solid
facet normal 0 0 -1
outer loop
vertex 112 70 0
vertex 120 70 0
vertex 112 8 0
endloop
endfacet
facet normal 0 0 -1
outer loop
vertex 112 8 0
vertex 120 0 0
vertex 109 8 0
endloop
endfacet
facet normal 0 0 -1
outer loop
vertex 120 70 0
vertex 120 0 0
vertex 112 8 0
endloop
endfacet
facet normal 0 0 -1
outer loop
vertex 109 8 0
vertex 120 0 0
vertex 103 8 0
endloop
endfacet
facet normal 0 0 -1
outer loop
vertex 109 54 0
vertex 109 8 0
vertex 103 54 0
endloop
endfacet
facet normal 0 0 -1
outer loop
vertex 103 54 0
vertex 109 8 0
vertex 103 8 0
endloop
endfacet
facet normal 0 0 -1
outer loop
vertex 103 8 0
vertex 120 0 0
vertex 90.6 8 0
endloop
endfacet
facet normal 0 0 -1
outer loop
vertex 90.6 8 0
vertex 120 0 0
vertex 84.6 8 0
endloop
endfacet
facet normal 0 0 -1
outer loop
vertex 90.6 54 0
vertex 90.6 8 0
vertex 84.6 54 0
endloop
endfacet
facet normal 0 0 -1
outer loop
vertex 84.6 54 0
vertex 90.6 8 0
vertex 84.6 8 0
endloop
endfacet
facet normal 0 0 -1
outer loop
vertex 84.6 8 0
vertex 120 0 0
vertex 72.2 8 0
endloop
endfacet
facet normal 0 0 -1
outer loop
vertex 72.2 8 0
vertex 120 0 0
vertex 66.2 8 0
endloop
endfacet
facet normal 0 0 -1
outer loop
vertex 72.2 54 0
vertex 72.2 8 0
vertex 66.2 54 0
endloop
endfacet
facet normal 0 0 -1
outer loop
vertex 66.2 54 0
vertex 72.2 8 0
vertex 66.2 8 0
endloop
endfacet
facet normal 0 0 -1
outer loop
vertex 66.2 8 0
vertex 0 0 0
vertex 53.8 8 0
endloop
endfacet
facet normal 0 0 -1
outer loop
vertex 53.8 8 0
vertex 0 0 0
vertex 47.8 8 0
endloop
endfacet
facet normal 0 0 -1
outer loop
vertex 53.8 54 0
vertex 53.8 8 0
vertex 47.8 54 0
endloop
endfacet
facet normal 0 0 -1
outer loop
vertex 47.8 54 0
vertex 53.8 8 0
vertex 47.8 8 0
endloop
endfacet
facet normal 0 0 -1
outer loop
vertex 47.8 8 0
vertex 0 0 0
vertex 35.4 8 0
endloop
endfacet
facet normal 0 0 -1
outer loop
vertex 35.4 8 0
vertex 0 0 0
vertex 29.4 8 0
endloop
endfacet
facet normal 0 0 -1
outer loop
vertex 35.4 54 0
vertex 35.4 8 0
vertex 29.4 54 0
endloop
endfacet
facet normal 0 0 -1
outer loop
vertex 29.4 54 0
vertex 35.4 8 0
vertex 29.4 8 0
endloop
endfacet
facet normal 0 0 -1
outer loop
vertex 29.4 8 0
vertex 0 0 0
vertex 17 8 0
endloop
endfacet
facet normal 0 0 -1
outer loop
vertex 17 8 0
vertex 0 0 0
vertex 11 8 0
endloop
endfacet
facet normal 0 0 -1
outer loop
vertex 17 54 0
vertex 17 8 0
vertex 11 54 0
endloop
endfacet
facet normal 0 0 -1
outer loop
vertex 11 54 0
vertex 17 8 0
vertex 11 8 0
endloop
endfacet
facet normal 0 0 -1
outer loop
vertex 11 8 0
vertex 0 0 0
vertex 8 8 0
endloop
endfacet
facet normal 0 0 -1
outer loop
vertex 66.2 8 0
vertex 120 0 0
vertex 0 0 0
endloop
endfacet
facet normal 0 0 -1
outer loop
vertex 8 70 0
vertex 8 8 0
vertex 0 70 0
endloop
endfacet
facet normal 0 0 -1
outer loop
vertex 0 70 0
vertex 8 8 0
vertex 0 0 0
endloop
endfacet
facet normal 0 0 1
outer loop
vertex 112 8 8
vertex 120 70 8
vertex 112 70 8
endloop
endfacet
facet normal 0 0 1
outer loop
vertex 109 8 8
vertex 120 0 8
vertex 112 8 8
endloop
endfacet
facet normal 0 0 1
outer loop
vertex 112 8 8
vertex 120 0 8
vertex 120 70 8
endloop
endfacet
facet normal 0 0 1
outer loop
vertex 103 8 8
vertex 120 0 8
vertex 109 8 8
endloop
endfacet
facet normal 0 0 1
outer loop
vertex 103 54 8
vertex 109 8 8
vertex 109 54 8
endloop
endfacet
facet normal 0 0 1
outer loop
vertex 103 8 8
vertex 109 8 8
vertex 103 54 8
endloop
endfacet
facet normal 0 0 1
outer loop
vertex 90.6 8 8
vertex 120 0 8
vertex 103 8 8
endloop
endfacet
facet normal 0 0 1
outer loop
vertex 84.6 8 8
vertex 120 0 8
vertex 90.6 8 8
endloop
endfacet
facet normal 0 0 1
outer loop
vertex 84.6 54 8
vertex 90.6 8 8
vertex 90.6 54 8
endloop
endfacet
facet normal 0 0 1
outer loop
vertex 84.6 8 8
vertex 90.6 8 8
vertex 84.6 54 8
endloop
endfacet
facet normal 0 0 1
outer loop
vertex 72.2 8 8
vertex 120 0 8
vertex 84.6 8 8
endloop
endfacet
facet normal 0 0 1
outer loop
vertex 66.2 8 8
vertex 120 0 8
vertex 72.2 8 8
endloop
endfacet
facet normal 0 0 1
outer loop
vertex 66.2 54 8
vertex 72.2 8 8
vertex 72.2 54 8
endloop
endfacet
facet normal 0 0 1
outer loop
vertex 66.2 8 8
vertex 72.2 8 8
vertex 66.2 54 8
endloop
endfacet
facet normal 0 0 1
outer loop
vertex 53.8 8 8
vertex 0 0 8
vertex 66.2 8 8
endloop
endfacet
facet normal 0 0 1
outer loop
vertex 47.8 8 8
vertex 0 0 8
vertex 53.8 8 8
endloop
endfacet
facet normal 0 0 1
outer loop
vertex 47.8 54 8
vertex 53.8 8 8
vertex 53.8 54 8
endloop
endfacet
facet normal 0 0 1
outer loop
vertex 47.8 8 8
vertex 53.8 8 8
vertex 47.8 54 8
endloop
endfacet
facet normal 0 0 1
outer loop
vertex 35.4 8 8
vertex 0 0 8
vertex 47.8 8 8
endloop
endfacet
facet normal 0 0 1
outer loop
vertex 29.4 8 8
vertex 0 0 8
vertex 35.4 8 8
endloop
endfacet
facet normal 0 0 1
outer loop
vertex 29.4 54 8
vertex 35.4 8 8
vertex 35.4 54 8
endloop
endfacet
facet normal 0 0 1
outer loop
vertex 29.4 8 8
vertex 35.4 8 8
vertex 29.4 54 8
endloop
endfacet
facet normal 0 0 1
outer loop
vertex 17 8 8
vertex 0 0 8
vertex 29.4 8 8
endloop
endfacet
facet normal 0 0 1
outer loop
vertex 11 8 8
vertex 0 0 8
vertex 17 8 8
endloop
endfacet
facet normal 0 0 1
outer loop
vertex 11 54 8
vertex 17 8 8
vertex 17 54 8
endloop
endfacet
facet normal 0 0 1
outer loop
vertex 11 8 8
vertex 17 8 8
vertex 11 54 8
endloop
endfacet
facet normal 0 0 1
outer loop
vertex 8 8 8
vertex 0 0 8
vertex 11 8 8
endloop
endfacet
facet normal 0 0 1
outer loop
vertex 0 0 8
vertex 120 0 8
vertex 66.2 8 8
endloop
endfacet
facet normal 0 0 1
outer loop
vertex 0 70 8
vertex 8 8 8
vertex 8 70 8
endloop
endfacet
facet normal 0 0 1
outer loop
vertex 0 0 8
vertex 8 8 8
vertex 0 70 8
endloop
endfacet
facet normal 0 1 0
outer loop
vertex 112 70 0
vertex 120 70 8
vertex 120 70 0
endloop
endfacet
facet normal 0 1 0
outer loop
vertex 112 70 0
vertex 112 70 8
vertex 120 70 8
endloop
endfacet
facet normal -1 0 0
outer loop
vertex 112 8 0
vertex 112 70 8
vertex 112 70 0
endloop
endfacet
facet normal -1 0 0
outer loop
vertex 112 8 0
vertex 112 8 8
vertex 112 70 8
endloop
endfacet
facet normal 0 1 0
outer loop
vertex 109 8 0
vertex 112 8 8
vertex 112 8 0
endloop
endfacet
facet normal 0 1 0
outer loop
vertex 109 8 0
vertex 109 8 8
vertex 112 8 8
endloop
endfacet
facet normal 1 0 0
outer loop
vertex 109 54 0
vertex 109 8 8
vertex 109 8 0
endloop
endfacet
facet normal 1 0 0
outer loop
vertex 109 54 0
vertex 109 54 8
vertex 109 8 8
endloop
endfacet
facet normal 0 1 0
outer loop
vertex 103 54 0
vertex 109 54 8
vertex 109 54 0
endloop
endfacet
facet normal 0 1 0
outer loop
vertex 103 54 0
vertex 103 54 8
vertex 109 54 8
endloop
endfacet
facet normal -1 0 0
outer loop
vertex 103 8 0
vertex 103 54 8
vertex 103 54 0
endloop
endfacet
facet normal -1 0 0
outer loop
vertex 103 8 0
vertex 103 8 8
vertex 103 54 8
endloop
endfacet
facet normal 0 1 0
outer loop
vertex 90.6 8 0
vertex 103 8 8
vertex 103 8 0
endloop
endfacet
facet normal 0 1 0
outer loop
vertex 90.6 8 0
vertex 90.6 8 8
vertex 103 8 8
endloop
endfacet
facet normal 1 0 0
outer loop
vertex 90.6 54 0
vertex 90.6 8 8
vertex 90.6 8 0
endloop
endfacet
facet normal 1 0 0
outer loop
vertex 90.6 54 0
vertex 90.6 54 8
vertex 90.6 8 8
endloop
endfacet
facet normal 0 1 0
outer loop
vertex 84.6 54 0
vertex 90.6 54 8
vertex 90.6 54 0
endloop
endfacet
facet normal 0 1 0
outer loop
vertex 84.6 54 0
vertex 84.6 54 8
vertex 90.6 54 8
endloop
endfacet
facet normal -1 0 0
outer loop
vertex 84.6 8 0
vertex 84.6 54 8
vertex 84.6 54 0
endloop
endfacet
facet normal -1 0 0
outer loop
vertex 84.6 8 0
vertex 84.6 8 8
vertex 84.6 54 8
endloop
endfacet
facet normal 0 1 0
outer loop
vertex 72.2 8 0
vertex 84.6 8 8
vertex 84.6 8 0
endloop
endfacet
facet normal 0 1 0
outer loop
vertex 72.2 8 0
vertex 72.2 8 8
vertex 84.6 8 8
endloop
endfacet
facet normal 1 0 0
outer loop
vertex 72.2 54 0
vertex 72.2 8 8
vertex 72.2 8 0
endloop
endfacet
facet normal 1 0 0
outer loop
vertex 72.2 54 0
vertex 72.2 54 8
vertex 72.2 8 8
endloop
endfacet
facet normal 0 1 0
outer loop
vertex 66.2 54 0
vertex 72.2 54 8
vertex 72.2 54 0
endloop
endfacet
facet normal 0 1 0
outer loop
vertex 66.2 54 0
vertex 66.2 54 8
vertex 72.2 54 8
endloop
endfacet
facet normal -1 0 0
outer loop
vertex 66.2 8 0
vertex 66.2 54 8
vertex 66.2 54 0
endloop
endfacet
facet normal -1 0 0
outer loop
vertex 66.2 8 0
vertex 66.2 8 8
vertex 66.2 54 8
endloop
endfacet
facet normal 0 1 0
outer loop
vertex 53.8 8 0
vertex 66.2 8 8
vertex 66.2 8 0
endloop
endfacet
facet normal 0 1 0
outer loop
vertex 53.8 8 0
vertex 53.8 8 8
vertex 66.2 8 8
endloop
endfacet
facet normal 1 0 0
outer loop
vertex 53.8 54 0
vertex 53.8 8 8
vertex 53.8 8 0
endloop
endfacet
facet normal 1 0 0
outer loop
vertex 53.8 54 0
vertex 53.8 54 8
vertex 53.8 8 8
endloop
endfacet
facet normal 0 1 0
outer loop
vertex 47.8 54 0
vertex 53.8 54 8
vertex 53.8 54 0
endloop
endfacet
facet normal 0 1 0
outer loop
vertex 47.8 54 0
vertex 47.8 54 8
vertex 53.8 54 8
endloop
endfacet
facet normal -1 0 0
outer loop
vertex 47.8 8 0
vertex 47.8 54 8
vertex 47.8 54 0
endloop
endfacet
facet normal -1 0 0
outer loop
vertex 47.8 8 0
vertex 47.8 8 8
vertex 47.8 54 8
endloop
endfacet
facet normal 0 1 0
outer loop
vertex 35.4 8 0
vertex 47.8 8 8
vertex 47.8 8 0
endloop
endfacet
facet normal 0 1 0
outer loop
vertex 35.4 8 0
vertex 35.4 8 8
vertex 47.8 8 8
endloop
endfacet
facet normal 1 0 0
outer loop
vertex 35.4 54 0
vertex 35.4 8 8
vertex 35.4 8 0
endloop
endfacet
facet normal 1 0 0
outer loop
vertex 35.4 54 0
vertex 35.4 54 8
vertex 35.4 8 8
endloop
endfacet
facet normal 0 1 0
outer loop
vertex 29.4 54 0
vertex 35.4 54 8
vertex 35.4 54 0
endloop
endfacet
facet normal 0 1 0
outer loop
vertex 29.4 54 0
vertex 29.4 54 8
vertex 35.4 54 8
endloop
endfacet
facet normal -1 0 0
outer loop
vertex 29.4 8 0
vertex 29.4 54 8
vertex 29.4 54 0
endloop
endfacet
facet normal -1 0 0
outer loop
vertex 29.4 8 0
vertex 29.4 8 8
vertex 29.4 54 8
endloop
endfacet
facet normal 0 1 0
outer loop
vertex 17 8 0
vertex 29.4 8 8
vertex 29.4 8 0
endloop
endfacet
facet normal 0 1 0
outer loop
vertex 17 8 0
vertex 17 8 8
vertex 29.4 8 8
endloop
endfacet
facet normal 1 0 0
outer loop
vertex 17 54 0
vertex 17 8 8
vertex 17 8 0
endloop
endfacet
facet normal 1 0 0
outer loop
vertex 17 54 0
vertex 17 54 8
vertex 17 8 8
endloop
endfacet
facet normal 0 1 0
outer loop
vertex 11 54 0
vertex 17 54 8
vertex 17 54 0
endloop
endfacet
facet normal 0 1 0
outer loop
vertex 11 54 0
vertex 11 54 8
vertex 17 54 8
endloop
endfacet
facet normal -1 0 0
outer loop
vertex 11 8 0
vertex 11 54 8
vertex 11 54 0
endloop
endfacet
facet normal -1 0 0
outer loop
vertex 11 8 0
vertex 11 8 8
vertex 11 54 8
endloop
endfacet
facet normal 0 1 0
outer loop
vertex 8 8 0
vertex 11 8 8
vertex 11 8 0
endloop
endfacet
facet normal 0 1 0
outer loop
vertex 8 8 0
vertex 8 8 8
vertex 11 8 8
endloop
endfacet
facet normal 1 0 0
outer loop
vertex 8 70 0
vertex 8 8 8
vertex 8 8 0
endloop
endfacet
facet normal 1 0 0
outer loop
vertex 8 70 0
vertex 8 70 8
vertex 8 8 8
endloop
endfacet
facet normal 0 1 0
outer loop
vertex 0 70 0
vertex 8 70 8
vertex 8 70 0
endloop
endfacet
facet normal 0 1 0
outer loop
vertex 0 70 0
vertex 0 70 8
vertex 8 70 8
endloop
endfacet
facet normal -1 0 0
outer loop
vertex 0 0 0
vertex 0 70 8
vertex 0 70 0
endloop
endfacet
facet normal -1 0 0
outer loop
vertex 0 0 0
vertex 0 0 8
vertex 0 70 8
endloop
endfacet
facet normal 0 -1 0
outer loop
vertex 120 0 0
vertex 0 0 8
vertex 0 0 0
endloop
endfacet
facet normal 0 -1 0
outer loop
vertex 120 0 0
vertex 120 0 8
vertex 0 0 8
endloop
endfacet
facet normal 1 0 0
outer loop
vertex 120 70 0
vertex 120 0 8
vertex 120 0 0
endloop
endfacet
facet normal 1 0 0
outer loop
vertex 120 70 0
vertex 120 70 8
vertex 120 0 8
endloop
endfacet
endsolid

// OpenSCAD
$fn = 32;

// ----------------------------------------------------------------------
// Guard grille: 6 slats over a 120 x 70 mm plate
// ----------------------------------------------------------------------

// --- parameters (mm) ---
profile_height = 8;       // extrusion height
profile_points = 32;      // points of the closed outline

profile = [[0, 0], [120, 0], [120, 70], [112, 70], [112, 8], [109, 8], [109, 54], [103, 54], [103, 8], [90.6, 8], [90.6, 54], [84.6, 54], [84.6, 8], [72.2, 8], [72.2, 54], [66.2, 54], [66.2, 8], [53.8, 8], [53.8, 54], [47.8, 54], [47.8, 8], [35.4, 8], [35.4, 54], [29.4, 54], [29.4, 8], [17, 8], [17, 54], [11, 54], [11, 8], [8, 8], [8, 70], [0, 70]];  // single closed polygon, 32 points, counter clockwise

// --- the one profile operation ---
linear_extrude(height = profile_height) polygon(points = profile);
